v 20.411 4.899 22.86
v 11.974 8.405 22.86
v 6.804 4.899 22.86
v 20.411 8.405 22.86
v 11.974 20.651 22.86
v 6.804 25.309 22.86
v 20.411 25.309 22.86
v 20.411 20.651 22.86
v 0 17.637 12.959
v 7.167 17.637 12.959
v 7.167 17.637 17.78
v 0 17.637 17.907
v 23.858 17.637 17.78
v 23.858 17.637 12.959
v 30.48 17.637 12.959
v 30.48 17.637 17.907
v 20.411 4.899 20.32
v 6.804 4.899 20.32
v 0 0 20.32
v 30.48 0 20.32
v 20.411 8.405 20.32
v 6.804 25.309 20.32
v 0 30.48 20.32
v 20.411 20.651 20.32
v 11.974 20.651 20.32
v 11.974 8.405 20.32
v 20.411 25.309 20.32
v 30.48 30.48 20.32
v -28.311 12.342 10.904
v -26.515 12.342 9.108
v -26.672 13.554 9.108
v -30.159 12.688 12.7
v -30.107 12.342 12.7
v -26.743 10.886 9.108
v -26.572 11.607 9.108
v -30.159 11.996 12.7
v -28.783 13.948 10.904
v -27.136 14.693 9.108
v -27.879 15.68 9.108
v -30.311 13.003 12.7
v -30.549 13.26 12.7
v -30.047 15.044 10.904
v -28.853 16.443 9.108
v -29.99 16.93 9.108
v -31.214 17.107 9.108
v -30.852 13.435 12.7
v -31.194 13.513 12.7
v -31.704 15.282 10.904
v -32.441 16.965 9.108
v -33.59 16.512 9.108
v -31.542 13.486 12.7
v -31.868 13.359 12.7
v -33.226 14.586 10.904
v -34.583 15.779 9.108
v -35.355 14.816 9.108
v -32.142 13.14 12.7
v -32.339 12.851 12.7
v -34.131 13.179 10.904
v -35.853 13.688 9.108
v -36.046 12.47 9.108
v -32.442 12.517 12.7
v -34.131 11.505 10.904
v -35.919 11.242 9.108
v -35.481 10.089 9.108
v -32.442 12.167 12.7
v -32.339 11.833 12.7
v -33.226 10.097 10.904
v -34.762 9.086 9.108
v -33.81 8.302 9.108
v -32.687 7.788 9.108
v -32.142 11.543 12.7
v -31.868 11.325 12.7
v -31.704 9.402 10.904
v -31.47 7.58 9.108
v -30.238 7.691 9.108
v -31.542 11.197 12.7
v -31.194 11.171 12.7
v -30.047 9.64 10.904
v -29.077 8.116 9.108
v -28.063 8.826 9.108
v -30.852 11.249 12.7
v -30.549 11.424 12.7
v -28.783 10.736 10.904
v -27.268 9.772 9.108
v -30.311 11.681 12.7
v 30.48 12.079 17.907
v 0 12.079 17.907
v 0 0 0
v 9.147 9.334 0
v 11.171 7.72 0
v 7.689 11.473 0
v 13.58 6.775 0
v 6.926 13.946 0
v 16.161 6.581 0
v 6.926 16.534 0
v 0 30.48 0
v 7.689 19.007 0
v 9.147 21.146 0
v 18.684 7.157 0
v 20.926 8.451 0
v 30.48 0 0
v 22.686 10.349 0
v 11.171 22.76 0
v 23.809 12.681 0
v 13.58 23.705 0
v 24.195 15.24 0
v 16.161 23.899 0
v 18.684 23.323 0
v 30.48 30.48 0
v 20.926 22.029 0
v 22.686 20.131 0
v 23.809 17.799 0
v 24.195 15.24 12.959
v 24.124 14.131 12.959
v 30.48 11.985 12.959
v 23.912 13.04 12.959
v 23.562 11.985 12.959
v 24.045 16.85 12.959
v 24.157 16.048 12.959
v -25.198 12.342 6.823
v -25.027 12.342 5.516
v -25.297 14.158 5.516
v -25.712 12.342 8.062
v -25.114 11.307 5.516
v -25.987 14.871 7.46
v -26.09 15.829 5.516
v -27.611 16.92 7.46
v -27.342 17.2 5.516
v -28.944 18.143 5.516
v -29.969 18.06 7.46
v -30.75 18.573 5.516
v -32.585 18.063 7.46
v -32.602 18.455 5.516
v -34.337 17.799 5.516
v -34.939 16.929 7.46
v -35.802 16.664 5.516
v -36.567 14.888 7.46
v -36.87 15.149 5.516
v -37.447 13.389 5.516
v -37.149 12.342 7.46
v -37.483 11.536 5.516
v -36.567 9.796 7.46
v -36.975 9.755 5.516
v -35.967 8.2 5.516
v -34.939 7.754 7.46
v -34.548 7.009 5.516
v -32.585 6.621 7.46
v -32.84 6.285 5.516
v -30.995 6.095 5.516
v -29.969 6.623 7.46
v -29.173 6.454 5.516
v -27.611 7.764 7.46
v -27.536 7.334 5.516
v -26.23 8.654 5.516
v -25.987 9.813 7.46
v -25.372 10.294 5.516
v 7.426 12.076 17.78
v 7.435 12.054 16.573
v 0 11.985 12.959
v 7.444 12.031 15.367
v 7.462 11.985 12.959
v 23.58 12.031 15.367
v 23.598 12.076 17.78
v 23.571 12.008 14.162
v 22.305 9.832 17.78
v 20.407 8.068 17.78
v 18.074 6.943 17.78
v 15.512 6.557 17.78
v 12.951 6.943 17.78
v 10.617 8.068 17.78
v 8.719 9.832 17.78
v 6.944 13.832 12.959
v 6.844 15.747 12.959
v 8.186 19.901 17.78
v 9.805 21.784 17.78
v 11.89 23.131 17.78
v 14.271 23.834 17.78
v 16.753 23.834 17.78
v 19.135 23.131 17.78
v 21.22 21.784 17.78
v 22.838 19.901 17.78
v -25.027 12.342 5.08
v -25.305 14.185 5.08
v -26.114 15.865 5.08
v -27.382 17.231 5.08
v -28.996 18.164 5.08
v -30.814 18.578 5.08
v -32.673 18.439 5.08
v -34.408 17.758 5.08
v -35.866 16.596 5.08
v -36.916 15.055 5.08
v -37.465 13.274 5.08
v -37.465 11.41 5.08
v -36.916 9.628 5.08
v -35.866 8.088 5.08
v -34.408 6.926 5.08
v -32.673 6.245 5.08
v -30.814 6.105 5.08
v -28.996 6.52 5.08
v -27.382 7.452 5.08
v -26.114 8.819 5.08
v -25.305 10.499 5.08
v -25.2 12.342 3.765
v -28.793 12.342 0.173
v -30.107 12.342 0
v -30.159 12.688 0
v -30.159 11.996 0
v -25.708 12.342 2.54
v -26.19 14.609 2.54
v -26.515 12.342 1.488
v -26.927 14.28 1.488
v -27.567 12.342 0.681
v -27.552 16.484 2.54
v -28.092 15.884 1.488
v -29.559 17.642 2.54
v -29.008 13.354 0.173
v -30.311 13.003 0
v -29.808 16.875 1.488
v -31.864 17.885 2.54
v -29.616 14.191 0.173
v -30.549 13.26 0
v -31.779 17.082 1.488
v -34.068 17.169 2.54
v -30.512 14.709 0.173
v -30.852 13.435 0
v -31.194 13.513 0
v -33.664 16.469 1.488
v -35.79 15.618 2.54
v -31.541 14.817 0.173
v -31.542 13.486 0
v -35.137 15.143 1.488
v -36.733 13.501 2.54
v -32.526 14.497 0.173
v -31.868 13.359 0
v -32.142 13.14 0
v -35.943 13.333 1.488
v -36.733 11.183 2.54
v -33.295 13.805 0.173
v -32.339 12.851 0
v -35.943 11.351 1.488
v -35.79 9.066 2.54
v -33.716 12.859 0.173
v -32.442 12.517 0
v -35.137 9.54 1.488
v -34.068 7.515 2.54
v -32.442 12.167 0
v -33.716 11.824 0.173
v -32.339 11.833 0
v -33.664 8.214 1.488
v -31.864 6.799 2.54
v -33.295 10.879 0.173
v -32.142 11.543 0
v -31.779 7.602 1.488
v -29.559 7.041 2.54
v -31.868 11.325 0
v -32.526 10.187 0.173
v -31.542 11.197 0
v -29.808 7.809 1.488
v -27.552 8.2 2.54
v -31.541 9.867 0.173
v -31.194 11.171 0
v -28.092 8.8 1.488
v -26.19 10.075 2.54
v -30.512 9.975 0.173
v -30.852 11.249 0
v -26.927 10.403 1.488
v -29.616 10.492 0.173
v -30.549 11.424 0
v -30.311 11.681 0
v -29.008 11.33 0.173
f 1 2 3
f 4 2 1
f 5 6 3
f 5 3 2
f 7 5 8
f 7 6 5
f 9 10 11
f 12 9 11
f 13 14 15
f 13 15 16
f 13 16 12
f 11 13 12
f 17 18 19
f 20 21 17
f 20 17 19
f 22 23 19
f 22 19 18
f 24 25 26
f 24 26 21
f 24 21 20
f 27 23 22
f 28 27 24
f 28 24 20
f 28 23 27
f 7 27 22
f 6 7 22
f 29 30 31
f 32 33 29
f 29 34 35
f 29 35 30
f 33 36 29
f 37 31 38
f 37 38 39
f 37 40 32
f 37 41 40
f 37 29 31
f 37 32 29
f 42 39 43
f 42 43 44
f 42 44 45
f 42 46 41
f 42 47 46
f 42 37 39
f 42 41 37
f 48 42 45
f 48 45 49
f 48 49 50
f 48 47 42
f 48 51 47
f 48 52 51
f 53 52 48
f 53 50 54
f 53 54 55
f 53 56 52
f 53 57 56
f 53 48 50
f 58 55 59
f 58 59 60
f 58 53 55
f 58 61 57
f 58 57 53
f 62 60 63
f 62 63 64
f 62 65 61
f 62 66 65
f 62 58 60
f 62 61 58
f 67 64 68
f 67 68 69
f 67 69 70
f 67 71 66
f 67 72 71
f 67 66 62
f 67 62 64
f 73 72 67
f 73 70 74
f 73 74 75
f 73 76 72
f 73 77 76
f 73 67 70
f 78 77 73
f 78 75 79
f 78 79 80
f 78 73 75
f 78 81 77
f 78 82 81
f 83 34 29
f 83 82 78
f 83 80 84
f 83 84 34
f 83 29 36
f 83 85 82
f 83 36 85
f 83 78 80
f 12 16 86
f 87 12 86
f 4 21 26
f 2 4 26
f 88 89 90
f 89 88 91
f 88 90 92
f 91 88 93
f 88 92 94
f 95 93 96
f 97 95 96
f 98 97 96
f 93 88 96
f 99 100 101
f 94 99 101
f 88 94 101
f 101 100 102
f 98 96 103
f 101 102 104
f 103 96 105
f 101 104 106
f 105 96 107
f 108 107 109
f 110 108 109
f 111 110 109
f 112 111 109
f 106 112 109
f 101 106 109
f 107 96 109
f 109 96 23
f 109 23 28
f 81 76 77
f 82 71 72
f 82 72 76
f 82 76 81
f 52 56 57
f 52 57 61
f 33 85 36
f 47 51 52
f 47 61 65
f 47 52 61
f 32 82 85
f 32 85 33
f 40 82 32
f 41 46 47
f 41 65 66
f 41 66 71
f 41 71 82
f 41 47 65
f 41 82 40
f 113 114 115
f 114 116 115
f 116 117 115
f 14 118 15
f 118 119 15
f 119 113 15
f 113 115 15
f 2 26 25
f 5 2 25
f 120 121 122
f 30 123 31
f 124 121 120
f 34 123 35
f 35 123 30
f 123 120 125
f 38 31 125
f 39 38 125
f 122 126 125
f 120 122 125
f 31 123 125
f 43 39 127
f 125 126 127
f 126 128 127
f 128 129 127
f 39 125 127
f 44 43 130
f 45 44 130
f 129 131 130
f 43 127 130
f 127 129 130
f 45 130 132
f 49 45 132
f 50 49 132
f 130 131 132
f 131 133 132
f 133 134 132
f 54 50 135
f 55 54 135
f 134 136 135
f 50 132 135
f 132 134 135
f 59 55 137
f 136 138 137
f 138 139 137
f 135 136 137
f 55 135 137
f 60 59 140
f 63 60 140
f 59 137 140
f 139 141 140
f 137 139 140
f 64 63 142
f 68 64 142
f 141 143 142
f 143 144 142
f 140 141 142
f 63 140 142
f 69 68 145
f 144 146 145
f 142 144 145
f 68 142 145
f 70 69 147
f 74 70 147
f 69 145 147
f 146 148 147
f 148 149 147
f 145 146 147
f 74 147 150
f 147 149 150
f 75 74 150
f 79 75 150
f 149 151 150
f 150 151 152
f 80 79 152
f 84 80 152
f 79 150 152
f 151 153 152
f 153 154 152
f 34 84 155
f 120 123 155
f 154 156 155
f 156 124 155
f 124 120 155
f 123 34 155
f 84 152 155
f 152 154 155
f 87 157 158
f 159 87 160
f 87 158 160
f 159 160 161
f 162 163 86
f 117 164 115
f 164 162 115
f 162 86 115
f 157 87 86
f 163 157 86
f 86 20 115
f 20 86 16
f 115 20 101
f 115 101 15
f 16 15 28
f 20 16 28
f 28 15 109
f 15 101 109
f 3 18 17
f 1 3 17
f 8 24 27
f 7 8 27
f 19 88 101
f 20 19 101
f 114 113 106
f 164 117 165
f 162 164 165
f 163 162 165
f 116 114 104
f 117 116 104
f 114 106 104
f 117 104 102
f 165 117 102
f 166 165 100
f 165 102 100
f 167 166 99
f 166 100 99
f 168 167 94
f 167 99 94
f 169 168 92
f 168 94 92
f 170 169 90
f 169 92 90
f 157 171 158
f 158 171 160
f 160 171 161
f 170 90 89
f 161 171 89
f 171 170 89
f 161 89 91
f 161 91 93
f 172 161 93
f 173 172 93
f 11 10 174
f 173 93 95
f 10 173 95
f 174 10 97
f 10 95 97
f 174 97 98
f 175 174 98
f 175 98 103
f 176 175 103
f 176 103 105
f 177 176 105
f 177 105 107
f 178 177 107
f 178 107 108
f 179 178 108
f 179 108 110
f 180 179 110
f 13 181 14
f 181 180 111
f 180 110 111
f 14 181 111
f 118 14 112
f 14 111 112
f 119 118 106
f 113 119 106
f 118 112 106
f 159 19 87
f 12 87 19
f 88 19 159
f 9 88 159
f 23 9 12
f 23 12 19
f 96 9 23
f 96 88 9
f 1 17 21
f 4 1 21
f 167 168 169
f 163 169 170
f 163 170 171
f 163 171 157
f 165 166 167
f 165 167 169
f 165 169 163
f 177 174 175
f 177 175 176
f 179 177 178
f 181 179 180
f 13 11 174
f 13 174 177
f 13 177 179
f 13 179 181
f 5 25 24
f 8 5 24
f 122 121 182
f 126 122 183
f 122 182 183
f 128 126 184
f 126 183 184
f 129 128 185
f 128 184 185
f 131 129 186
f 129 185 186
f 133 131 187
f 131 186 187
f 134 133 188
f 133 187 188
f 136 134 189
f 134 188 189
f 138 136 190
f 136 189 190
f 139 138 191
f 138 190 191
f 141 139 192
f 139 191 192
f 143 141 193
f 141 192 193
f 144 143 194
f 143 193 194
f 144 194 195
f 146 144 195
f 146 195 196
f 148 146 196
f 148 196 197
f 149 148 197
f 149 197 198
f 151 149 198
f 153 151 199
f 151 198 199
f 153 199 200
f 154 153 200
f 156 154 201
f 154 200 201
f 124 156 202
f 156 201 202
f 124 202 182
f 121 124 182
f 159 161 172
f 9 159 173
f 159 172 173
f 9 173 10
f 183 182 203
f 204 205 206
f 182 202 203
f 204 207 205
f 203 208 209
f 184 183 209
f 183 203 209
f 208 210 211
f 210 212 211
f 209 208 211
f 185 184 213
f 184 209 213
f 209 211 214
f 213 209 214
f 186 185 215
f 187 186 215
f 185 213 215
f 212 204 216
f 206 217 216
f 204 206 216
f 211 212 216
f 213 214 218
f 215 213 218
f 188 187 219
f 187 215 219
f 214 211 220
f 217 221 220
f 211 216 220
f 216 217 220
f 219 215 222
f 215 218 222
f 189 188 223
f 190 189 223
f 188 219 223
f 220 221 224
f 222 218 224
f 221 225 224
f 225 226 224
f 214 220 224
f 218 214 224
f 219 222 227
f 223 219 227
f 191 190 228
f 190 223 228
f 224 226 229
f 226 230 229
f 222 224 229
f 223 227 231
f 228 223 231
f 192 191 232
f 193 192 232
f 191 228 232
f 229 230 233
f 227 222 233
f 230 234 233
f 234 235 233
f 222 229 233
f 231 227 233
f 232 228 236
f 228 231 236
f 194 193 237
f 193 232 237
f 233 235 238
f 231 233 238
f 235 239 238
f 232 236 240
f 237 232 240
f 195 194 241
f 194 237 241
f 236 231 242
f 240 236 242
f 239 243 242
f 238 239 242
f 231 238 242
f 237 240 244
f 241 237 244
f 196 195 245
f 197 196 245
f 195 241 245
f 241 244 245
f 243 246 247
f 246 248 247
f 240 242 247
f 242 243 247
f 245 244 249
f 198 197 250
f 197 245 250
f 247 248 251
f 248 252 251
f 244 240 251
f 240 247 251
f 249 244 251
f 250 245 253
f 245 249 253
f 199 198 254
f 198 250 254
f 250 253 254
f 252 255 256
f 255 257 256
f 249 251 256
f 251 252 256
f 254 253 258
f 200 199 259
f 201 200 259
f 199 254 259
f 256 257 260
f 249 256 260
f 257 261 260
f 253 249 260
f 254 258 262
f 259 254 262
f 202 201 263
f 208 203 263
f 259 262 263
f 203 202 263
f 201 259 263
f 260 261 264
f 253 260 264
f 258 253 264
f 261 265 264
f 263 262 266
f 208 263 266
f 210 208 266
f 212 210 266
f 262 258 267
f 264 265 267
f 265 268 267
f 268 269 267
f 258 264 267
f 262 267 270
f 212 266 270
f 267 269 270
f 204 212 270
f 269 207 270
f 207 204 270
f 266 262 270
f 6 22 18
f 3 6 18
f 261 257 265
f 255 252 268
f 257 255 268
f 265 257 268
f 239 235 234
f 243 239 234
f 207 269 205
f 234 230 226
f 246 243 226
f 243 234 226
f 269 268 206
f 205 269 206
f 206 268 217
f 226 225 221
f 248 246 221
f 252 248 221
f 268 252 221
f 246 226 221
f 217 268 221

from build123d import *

# Parameters (mm, degrees)
F0_W     = 30.480001
F0_H     = 30.480001
F1_DEPTH = 20.32
F2_R     = 8.68302
F3_DEPTH = 17.78
F5_DEPTH = 35.56
F7_DEPTH = 2.54
F8_R     = 6.253956
F9_DEPTH = 12.7
F10_SIZE = 5.08
F11_R    = 5.08


with BuildPart() as f1:
    # F0 (on Top) → F1 (new body)
    with BuildSketch(Plane.XY):
        with Locations((15.24, 15.24)):
            Rectangle(F0_W, F0_H)
    extrude(amount=F1_DEPTH)

    # F2 (on face) → F3 (cut)
    with BuildSketch(Plane(origin=(0, 0, 0), x_dir=(1, 0, 0), z_dir=(0, 0, -1))):
        with Locations((15.512145, -15.240001)):
            Circle(F2_R)
    extrude(amount=-F3_DEPTH, mode=Mode.SUBTRACT)

    # F4 (on face) → F5 (cut)
    with BuildSketch(Plane.YZ.offset(30.480001)):
        Polygon((12.078644, 17.906604), (11.985387, 12.958826), (17.637255, 12.958826), (17.637255, 17.906604), align=None)
    extrude(amount=-F5_DEPTH, mode=Mode.SUBTRACT)

    # F6 (on face) → F7 (join)
    with BuildSketch(Plane.XY.offset(20.32)):
        Polygon((11.974289, 20.650951), (20.410715, 20.650951), (20.410715, 25.309285), (6.803572, 25.309285), (6.803572, 4.898571), (20.410715, 4.898571), (20.410715, 8.404521), (11.974289, 8.404521), align=None)
    extrude(amount=F7_DEPTH)


with BuildPart() as f9:
    # F8 (on Top) → F9 (new body)
    with BuildSketch(Plane.XY):
        with Locations((-31.281259, 12.341898)):
            Circle(F8_R)
    extrude(amount=F9_DEPTH)

    # F10
    f10_edges = [f9.edges().sort_by_distance(p)[0] for p in [
        (-37.535214, 12.341898, 12.7),
    ]]
    chamfer(f10_edges, length=F10_SIZE)

    # F11
    f11_edges = [f9.edges().sort_by_distance(p)[0] for p in [
        (-25.027303, 12.341898, 3.81),
        (-37.535214, 12.341898, 7.62),
        (-37.535214, 12.341898, 0),
    ]]
    fillet(f11_edges, radius=F11_R)


solid = Compound([f1.part, f9.part])
